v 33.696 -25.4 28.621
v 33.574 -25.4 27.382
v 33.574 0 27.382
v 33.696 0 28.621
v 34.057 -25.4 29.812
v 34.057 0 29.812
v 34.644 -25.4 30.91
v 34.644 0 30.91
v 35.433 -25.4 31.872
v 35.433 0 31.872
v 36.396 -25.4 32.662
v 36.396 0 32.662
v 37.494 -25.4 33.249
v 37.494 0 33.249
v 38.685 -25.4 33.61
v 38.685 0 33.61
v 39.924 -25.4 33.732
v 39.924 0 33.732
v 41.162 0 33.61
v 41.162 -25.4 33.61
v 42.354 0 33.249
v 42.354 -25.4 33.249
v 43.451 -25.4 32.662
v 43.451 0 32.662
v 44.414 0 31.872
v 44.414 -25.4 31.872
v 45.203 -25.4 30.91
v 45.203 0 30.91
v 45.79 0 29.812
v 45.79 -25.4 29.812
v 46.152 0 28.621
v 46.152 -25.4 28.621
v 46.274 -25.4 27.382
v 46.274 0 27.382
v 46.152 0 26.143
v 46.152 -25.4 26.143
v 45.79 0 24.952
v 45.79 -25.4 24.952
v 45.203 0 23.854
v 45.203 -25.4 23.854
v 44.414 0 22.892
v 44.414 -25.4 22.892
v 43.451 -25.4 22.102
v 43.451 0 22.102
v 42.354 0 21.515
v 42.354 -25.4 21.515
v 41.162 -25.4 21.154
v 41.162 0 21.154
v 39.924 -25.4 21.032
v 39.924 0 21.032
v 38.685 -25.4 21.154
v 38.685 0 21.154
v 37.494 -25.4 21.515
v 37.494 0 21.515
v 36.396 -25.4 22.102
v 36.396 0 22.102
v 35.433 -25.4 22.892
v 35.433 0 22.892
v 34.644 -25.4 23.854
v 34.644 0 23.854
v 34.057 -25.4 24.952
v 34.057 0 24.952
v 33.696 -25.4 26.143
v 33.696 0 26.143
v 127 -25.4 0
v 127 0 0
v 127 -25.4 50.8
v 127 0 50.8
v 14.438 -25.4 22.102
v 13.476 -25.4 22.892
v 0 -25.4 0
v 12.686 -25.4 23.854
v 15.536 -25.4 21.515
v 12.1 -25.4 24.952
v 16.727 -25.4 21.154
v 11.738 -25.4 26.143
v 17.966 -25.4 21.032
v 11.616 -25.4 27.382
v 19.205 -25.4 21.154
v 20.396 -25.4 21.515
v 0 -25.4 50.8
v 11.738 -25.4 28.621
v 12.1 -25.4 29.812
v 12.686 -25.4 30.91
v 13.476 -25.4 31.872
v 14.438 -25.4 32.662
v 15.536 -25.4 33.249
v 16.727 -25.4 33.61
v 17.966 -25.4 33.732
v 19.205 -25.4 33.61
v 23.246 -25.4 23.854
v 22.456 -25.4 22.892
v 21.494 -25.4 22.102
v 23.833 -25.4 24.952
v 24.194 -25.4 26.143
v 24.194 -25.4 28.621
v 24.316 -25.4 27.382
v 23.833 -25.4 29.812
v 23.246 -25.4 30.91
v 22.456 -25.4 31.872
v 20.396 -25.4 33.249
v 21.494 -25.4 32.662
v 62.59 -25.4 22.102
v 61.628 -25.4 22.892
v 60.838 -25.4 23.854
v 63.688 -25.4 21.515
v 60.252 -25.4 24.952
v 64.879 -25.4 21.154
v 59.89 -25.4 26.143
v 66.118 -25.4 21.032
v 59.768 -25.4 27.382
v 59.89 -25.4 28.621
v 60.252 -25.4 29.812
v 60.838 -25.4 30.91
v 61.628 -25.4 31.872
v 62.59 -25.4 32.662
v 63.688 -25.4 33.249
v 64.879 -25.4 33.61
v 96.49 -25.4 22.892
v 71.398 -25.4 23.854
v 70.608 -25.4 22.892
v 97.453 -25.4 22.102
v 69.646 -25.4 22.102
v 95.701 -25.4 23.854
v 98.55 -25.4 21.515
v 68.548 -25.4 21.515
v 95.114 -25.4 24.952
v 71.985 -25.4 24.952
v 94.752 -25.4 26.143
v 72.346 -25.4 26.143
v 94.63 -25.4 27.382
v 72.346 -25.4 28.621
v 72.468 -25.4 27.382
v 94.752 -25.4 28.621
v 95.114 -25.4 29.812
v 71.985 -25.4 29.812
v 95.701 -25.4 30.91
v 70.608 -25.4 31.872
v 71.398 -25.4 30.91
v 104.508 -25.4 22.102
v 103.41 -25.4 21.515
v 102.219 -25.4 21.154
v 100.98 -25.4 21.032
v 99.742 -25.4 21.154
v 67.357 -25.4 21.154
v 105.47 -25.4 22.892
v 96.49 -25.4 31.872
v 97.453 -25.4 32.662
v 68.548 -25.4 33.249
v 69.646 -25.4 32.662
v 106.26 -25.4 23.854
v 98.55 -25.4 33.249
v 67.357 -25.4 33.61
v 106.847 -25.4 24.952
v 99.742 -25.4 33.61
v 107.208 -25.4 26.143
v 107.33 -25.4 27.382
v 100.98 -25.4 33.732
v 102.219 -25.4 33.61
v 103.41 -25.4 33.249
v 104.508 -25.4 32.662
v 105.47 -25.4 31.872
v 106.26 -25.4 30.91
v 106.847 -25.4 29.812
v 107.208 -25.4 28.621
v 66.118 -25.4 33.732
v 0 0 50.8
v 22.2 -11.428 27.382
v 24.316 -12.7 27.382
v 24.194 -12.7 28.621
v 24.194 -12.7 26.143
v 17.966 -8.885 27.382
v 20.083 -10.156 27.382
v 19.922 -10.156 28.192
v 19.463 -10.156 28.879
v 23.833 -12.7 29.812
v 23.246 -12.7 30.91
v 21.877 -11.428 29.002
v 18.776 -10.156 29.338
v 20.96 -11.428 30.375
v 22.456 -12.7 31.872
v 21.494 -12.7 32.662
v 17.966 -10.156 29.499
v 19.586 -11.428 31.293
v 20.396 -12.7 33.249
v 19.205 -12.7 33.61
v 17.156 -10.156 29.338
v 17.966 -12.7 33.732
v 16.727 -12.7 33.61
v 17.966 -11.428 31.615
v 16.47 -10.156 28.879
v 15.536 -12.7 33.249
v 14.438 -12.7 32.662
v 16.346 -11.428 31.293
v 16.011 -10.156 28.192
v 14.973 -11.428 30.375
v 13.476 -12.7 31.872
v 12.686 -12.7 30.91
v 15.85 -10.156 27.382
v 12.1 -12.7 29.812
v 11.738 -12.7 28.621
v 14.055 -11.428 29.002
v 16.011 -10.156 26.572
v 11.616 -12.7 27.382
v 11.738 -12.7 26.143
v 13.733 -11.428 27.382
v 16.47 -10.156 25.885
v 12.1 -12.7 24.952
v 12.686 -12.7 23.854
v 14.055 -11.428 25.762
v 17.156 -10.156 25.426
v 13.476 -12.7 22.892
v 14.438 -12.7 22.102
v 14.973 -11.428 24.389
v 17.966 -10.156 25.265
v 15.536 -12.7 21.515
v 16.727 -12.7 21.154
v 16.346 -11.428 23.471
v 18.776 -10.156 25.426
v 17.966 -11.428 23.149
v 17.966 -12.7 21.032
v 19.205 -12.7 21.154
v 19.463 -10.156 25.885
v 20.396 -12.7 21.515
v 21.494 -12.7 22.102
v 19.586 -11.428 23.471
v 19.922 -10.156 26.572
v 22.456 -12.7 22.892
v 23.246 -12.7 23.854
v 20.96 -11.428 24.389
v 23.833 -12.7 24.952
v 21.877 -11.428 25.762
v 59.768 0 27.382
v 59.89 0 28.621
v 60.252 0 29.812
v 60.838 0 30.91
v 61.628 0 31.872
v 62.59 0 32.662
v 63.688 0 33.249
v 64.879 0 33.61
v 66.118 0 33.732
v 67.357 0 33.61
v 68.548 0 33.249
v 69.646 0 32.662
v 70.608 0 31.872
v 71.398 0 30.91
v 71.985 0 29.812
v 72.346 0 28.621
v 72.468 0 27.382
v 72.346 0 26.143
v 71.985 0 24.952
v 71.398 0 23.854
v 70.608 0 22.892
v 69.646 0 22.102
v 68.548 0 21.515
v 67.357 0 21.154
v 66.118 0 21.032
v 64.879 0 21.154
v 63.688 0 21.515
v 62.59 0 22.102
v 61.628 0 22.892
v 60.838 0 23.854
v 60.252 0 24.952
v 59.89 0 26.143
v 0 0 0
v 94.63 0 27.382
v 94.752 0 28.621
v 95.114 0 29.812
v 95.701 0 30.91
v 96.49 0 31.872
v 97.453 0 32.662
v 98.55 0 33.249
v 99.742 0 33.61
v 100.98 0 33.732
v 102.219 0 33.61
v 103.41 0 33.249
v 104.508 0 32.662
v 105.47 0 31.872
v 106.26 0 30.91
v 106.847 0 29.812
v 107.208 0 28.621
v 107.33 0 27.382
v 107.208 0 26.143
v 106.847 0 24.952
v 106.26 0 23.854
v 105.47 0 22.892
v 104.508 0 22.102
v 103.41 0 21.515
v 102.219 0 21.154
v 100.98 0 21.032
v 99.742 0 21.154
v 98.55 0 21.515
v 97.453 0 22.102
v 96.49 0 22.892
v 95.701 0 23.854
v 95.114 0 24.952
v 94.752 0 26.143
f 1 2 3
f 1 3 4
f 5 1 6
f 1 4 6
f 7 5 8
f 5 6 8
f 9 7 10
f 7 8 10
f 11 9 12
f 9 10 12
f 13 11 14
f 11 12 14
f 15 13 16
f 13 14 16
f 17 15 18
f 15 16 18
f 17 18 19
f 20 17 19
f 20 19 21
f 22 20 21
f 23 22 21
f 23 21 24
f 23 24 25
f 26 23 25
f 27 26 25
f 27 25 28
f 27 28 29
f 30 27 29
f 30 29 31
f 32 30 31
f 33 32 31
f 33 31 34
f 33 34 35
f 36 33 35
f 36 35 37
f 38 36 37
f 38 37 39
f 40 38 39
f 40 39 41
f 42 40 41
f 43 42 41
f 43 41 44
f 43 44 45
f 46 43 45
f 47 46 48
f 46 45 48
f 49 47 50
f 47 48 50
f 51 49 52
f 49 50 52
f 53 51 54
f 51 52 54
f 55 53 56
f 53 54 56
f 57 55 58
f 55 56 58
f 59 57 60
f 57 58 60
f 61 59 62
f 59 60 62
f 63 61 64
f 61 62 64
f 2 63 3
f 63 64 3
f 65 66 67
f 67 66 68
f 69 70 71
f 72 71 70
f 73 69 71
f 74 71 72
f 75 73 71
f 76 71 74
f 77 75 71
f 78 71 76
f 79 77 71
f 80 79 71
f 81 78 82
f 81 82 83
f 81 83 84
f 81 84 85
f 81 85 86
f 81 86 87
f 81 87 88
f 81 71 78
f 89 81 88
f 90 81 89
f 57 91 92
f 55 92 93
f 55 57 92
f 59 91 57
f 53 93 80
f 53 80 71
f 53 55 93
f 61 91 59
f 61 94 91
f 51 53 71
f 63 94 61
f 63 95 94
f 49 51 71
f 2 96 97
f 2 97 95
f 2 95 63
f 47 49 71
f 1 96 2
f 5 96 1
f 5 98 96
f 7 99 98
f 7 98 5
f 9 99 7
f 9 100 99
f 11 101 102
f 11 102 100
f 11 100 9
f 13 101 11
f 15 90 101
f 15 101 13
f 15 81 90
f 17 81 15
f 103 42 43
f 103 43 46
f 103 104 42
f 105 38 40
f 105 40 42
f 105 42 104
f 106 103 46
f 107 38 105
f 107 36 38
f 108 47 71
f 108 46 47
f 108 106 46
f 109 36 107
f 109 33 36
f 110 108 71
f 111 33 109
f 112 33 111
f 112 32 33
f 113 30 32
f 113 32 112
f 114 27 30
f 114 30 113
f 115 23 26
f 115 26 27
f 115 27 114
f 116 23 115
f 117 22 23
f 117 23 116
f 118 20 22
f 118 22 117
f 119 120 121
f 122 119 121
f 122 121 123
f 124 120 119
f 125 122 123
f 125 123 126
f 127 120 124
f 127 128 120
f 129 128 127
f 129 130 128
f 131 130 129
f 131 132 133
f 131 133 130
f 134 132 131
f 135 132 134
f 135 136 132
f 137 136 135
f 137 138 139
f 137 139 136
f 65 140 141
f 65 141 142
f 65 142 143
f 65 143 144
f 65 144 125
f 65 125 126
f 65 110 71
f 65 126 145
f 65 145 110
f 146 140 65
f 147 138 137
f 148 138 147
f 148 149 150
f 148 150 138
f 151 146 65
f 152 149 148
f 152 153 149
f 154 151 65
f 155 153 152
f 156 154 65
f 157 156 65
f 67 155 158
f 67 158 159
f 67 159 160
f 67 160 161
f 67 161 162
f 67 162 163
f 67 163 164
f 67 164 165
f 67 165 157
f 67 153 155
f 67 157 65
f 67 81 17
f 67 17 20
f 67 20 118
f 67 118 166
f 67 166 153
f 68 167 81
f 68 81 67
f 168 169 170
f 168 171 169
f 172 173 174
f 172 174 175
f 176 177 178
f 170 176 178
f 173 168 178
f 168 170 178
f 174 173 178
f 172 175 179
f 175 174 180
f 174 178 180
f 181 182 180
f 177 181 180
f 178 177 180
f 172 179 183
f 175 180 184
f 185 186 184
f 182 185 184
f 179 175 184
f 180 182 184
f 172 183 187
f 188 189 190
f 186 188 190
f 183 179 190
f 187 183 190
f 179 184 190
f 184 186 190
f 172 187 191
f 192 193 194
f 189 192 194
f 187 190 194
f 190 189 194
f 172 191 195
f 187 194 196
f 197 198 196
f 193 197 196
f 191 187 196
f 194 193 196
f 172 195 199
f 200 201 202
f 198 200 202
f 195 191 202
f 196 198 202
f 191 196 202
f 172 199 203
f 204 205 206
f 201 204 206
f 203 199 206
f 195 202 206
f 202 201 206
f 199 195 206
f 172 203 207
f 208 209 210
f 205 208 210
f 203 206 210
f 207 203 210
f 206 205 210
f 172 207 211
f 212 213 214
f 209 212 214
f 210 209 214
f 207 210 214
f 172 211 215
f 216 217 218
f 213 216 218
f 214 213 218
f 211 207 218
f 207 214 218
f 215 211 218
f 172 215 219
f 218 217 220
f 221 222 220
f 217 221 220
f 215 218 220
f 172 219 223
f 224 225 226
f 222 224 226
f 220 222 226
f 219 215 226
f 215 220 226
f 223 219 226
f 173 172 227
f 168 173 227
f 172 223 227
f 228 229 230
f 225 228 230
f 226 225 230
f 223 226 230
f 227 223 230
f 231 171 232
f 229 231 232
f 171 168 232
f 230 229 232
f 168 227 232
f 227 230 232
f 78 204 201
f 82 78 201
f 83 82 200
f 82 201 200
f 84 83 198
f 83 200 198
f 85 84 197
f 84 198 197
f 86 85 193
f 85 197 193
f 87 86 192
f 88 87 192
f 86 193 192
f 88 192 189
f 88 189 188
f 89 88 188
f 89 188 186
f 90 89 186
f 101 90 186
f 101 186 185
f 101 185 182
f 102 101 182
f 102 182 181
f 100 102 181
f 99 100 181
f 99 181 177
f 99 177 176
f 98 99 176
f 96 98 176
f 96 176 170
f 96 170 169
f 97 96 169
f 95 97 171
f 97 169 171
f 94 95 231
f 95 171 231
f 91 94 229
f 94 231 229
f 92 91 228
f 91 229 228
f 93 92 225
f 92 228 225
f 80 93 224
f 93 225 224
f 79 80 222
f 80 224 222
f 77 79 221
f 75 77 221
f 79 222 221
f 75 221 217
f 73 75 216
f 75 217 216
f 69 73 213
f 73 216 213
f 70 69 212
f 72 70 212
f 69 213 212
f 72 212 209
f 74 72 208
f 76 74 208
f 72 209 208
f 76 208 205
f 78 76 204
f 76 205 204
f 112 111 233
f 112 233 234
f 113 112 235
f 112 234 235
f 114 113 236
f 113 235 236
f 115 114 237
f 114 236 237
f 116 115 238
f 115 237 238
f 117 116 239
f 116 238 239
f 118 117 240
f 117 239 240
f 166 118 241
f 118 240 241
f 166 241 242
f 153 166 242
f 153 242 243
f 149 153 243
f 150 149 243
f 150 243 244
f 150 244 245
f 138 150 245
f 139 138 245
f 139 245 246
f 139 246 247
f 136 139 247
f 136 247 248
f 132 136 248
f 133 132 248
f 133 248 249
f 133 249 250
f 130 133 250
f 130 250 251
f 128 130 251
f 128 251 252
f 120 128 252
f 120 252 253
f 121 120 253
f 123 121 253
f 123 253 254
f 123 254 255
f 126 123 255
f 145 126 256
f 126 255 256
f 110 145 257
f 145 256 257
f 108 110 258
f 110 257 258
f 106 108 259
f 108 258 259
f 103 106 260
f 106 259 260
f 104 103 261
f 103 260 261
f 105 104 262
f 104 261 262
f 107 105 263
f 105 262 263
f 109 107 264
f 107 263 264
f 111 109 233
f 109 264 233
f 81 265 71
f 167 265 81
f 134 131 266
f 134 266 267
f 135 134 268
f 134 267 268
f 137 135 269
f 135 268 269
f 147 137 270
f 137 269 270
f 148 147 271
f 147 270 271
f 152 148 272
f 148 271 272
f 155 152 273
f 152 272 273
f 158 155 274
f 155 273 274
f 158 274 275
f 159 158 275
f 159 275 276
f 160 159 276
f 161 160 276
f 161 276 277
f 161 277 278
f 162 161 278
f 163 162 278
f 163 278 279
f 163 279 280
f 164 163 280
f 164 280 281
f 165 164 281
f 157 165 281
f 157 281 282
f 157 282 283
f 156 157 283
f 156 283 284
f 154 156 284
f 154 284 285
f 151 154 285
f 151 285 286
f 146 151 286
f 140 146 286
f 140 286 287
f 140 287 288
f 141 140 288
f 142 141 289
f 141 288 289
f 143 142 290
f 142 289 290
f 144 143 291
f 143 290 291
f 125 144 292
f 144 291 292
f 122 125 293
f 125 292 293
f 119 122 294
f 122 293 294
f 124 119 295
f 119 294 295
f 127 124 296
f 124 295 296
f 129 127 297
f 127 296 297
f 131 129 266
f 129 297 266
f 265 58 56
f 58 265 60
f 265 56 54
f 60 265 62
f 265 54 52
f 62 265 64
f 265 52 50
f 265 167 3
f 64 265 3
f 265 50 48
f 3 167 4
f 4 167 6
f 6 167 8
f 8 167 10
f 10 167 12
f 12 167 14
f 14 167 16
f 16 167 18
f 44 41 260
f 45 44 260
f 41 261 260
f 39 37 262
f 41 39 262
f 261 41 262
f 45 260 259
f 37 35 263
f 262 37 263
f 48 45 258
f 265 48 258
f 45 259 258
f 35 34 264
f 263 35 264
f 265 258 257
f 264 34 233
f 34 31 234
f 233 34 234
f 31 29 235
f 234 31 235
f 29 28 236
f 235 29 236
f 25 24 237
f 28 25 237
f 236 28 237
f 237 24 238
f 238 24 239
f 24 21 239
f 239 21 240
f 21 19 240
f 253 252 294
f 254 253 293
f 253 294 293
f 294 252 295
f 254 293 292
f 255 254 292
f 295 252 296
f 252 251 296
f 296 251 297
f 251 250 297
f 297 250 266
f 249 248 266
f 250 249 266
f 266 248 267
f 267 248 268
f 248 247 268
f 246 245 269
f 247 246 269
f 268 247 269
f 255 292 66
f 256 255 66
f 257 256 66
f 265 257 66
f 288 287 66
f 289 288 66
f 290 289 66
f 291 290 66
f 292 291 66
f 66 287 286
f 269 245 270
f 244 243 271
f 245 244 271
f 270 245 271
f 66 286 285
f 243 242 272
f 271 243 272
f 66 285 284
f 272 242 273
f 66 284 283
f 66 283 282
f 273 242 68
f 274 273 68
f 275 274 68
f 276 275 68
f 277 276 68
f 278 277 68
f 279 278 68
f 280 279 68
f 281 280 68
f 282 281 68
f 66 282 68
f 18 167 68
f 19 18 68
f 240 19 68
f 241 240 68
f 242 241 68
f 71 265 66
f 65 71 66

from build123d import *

# Parameters (mm, degrees)
F0_W           = 127
F0_H           = 50.8
F1_DEPTH       = 25.4
F3_D           = 12.7
F3_DEPTH       = 12.7
F3_CBORE_D     = 12.7
F3_CBORE_DEPTH = 6.35
F3_TIP         = 3.8154649308
F4_D           = 12.7
F5_D           = 12.7
F6_D           = 12.7


with BuildPart() as f1:
    # F0 (on Front) → F1 (new body)
    with BuildSketch(Plane.XZ):
        with Locations((63.5, 25.4)):
            Rectangle(F0_W, F0_H)
    extrude(amount=F1_DEPTH)

    # F3
    with Locations(Plane.XZ.offset(25.4)):
        with Locations((17.9662257433, 27.3820236325)):
            CounterBoreHole(F3_D / 2, F3_CBORE_D / 2, F3_CBORE_DEPTH, depth=F3_DEPTH)
            with Locations((0, 0, -(F3_DEPTH + F3_TIP / 2))):  # 118° drill point
                Cone(0, F3_D / 2, F3_TIP, mode=Mode.SUBTRACT)

    # F4 (through all)
    with Locations(Plane.XZ.offset(25.4)):
        with Locations((39.9235635996, 27.3820236325)):
            Hole(F4_D / 2)

    # F5 (through all)
    with Locations(Plane.XZ.offset(25.4)):
        with Locations((66.1182850599, 27.3820236325)):
            Hole(F5_D / 2)

    # F6 (through all)
    with Locations(Plane.XZ.offset(25.4)):
        with Locations((100.9803712368, 27.3820236325)):
            Hole(F6_D / 2)


solid = f1.part
